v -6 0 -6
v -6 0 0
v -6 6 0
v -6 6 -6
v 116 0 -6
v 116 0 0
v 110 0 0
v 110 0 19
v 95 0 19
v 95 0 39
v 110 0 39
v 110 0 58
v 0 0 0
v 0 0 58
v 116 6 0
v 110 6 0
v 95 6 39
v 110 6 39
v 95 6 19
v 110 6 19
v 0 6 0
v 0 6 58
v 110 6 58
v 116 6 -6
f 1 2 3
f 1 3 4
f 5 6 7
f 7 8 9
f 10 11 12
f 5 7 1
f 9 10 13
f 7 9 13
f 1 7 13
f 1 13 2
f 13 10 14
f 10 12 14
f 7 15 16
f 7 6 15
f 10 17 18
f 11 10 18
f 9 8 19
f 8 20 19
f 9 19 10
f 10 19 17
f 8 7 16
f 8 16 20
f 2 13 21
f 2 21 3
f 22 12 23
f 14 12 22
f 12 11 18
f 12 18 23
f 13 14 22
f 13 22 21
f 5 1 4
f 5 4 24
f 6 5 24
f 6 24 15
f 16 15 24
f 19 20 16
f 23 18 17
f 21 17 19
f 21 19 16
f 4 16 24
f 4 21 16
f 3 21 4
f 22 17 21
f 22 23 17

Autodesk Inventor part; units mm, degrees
ref_plane "YZ Plane" through (0, 0, 0) normal (1, 0, 0) x (0, 1, 0)
ref_plane "XZ Plane" through (0, 0, 0) normal (0, 1, 0) x (-1, 0, 0)
ref_plane "XY Plane" through (0, 0, 0) normal (0, 0, 1) x (1, 0, 0)
sketch "Sketch1" plane through (0, 0, 0) normal (0, 1, 0) x (-1, 0, 0)
  line L0 (0, 0) -> (6, 0)
  line L1 (6, 0) -> (6, -6)
  line L2 (6, -6) -> (0, -6)
  line L3 (0, -6) -> (0, 0)
  line L4 (0, -6) -> (-55, -6)
  line L5 (-55, -6) -> (-55, 58)
  line L6 (-55, 58) -> (0, 58)
  line L7 (0, 58) -> (0, -6)
  dimension "d0" = 6
  dimension "d1" = 6
  dimension "d2" = 55
  dimension "d3" = 64
extrude "Extrusion1" add sketch "Sketch1" along normal blind 6
mirror "Mirror1" about plane through (55, 0, 58) normal (1, 0, 0) of "Extrusion1"
sketch "Sketch2" plane through (0, 6, 0) normal (0, 1, 0) x (1, 0, 0)
  line L0 (0, -58) -> (110, -58) projected
  line L1 (0, -58) -> (110, -58) projected
  line L2 (0, -58) -> (110, -58) projected
  line L3 (0, -58) -> (110, -58) projected
  line L4 (-6, 6) -> (-6, 0) projected
  line L5 (-6, 0) -> (0, 0) projected
  line L6 (0, 0) -> (0, -58) projected
  line L7 (0, -58) -> (110, -58) projected
  line L8 (110, 0) -> (110, -58) projected
  line L9 (116, 0) -> (110, 0) projected
  line L10 (116, 6) -> (116, 0) projected
  line L11 (-6, 6) -> (116, 6) projected
  line L12 (-6, 6) -> (116, 6) projected
  line L13 (-6, 6) -> (-6, 0) projected
  line L14 (-6, 6) -> (116, 6) projected
  line L15 (116, 6) -> (116, 0) projected
  line L16 (116, 0) -> (110, 0) projected
  line L17 (110, 0) -> (110, -58) projected
  line L18 (0, -58) -> (110, -58) projected
  line L19 (0, 0) -> (0, -58) projected
  line L20 (-6, 0) -> (0, 0) projected
  line L21 (-6, 6) -> (116, 6) projected
  line L22 (-6, 6) -> (116, 6) projected
  line L23 (-6, 6) -> (116, 6) projected
  line L24 (0, 0) -> (0, -58) projected
  line L25 (0, 0) -> (0, -58) projected
  line L26 (0, 0) -> (0, -58) projected
  line L27 (0, 0) -> (0, -58) projected
  line L28 (-6, 6) -> (-6, 0) projected
  line L29 (-6, 6) -> (-6, 0) projected
  line L30 (-6, 6) -> (-6, 0) projected
  line L31 (-6, 6) -> (-6, 0) projected
  line L32 (-6, 0) -> (0, 0) projected
  line L33 (-6, 0) -> (0, 0) projected
  line L34 (-6, 0) -> (0, 0) projected
  line L35 (-6, 0) -> (0, 0) projected
  line L36 (110, 0) -> (110, -58) projected
  line L37 (110, 0) -> (110, -58) projected
  line L38 (110, 0) -> (110, -58) projected
  line L39 (110, 0) -> (110, -58) projected
  line L40 (116, 0) -> (110, 0) projected
  line L41 (116, 0) -> (110, 0) projected
  line L42 (116, 0) -> (110, 0) projected
  line L43 (116, 0) -> (110, 0) projected
  line L44 (116, 6) -> (116, 0) projected
  line L45 (116, 6) -> (116, 0) projected
  line L46 (116, 6) -> (116, 0) projected
  line L47 (116, 6) -> (116, 0) projected
  line L48 (95, -39) -> (110, -39)
  line L49 (125, -39) -> (125, -19)
  line L50 (125, -19) -> (110, -19)
  line L51 (95, -19) -> (95, -39)
  line L52 (95, -39) -> (125, -19) construction
  line L53 (125, -39) -> (95, -19) construction
  line L54 (110, -19) -> (95, -19)
  line L55 (110, -39) -> (125, -39)
  line L56 (110, -19) -> (110, -39)
  point P0 (110, -29)
  dimension "d6" = 30
  dimension "d7" = 20
extrude "Extrusion2" cut sketch "Sketch2" against normal blind 10 contours L48 L51 L54 L8
properties part number "wall 1 for sorting"
